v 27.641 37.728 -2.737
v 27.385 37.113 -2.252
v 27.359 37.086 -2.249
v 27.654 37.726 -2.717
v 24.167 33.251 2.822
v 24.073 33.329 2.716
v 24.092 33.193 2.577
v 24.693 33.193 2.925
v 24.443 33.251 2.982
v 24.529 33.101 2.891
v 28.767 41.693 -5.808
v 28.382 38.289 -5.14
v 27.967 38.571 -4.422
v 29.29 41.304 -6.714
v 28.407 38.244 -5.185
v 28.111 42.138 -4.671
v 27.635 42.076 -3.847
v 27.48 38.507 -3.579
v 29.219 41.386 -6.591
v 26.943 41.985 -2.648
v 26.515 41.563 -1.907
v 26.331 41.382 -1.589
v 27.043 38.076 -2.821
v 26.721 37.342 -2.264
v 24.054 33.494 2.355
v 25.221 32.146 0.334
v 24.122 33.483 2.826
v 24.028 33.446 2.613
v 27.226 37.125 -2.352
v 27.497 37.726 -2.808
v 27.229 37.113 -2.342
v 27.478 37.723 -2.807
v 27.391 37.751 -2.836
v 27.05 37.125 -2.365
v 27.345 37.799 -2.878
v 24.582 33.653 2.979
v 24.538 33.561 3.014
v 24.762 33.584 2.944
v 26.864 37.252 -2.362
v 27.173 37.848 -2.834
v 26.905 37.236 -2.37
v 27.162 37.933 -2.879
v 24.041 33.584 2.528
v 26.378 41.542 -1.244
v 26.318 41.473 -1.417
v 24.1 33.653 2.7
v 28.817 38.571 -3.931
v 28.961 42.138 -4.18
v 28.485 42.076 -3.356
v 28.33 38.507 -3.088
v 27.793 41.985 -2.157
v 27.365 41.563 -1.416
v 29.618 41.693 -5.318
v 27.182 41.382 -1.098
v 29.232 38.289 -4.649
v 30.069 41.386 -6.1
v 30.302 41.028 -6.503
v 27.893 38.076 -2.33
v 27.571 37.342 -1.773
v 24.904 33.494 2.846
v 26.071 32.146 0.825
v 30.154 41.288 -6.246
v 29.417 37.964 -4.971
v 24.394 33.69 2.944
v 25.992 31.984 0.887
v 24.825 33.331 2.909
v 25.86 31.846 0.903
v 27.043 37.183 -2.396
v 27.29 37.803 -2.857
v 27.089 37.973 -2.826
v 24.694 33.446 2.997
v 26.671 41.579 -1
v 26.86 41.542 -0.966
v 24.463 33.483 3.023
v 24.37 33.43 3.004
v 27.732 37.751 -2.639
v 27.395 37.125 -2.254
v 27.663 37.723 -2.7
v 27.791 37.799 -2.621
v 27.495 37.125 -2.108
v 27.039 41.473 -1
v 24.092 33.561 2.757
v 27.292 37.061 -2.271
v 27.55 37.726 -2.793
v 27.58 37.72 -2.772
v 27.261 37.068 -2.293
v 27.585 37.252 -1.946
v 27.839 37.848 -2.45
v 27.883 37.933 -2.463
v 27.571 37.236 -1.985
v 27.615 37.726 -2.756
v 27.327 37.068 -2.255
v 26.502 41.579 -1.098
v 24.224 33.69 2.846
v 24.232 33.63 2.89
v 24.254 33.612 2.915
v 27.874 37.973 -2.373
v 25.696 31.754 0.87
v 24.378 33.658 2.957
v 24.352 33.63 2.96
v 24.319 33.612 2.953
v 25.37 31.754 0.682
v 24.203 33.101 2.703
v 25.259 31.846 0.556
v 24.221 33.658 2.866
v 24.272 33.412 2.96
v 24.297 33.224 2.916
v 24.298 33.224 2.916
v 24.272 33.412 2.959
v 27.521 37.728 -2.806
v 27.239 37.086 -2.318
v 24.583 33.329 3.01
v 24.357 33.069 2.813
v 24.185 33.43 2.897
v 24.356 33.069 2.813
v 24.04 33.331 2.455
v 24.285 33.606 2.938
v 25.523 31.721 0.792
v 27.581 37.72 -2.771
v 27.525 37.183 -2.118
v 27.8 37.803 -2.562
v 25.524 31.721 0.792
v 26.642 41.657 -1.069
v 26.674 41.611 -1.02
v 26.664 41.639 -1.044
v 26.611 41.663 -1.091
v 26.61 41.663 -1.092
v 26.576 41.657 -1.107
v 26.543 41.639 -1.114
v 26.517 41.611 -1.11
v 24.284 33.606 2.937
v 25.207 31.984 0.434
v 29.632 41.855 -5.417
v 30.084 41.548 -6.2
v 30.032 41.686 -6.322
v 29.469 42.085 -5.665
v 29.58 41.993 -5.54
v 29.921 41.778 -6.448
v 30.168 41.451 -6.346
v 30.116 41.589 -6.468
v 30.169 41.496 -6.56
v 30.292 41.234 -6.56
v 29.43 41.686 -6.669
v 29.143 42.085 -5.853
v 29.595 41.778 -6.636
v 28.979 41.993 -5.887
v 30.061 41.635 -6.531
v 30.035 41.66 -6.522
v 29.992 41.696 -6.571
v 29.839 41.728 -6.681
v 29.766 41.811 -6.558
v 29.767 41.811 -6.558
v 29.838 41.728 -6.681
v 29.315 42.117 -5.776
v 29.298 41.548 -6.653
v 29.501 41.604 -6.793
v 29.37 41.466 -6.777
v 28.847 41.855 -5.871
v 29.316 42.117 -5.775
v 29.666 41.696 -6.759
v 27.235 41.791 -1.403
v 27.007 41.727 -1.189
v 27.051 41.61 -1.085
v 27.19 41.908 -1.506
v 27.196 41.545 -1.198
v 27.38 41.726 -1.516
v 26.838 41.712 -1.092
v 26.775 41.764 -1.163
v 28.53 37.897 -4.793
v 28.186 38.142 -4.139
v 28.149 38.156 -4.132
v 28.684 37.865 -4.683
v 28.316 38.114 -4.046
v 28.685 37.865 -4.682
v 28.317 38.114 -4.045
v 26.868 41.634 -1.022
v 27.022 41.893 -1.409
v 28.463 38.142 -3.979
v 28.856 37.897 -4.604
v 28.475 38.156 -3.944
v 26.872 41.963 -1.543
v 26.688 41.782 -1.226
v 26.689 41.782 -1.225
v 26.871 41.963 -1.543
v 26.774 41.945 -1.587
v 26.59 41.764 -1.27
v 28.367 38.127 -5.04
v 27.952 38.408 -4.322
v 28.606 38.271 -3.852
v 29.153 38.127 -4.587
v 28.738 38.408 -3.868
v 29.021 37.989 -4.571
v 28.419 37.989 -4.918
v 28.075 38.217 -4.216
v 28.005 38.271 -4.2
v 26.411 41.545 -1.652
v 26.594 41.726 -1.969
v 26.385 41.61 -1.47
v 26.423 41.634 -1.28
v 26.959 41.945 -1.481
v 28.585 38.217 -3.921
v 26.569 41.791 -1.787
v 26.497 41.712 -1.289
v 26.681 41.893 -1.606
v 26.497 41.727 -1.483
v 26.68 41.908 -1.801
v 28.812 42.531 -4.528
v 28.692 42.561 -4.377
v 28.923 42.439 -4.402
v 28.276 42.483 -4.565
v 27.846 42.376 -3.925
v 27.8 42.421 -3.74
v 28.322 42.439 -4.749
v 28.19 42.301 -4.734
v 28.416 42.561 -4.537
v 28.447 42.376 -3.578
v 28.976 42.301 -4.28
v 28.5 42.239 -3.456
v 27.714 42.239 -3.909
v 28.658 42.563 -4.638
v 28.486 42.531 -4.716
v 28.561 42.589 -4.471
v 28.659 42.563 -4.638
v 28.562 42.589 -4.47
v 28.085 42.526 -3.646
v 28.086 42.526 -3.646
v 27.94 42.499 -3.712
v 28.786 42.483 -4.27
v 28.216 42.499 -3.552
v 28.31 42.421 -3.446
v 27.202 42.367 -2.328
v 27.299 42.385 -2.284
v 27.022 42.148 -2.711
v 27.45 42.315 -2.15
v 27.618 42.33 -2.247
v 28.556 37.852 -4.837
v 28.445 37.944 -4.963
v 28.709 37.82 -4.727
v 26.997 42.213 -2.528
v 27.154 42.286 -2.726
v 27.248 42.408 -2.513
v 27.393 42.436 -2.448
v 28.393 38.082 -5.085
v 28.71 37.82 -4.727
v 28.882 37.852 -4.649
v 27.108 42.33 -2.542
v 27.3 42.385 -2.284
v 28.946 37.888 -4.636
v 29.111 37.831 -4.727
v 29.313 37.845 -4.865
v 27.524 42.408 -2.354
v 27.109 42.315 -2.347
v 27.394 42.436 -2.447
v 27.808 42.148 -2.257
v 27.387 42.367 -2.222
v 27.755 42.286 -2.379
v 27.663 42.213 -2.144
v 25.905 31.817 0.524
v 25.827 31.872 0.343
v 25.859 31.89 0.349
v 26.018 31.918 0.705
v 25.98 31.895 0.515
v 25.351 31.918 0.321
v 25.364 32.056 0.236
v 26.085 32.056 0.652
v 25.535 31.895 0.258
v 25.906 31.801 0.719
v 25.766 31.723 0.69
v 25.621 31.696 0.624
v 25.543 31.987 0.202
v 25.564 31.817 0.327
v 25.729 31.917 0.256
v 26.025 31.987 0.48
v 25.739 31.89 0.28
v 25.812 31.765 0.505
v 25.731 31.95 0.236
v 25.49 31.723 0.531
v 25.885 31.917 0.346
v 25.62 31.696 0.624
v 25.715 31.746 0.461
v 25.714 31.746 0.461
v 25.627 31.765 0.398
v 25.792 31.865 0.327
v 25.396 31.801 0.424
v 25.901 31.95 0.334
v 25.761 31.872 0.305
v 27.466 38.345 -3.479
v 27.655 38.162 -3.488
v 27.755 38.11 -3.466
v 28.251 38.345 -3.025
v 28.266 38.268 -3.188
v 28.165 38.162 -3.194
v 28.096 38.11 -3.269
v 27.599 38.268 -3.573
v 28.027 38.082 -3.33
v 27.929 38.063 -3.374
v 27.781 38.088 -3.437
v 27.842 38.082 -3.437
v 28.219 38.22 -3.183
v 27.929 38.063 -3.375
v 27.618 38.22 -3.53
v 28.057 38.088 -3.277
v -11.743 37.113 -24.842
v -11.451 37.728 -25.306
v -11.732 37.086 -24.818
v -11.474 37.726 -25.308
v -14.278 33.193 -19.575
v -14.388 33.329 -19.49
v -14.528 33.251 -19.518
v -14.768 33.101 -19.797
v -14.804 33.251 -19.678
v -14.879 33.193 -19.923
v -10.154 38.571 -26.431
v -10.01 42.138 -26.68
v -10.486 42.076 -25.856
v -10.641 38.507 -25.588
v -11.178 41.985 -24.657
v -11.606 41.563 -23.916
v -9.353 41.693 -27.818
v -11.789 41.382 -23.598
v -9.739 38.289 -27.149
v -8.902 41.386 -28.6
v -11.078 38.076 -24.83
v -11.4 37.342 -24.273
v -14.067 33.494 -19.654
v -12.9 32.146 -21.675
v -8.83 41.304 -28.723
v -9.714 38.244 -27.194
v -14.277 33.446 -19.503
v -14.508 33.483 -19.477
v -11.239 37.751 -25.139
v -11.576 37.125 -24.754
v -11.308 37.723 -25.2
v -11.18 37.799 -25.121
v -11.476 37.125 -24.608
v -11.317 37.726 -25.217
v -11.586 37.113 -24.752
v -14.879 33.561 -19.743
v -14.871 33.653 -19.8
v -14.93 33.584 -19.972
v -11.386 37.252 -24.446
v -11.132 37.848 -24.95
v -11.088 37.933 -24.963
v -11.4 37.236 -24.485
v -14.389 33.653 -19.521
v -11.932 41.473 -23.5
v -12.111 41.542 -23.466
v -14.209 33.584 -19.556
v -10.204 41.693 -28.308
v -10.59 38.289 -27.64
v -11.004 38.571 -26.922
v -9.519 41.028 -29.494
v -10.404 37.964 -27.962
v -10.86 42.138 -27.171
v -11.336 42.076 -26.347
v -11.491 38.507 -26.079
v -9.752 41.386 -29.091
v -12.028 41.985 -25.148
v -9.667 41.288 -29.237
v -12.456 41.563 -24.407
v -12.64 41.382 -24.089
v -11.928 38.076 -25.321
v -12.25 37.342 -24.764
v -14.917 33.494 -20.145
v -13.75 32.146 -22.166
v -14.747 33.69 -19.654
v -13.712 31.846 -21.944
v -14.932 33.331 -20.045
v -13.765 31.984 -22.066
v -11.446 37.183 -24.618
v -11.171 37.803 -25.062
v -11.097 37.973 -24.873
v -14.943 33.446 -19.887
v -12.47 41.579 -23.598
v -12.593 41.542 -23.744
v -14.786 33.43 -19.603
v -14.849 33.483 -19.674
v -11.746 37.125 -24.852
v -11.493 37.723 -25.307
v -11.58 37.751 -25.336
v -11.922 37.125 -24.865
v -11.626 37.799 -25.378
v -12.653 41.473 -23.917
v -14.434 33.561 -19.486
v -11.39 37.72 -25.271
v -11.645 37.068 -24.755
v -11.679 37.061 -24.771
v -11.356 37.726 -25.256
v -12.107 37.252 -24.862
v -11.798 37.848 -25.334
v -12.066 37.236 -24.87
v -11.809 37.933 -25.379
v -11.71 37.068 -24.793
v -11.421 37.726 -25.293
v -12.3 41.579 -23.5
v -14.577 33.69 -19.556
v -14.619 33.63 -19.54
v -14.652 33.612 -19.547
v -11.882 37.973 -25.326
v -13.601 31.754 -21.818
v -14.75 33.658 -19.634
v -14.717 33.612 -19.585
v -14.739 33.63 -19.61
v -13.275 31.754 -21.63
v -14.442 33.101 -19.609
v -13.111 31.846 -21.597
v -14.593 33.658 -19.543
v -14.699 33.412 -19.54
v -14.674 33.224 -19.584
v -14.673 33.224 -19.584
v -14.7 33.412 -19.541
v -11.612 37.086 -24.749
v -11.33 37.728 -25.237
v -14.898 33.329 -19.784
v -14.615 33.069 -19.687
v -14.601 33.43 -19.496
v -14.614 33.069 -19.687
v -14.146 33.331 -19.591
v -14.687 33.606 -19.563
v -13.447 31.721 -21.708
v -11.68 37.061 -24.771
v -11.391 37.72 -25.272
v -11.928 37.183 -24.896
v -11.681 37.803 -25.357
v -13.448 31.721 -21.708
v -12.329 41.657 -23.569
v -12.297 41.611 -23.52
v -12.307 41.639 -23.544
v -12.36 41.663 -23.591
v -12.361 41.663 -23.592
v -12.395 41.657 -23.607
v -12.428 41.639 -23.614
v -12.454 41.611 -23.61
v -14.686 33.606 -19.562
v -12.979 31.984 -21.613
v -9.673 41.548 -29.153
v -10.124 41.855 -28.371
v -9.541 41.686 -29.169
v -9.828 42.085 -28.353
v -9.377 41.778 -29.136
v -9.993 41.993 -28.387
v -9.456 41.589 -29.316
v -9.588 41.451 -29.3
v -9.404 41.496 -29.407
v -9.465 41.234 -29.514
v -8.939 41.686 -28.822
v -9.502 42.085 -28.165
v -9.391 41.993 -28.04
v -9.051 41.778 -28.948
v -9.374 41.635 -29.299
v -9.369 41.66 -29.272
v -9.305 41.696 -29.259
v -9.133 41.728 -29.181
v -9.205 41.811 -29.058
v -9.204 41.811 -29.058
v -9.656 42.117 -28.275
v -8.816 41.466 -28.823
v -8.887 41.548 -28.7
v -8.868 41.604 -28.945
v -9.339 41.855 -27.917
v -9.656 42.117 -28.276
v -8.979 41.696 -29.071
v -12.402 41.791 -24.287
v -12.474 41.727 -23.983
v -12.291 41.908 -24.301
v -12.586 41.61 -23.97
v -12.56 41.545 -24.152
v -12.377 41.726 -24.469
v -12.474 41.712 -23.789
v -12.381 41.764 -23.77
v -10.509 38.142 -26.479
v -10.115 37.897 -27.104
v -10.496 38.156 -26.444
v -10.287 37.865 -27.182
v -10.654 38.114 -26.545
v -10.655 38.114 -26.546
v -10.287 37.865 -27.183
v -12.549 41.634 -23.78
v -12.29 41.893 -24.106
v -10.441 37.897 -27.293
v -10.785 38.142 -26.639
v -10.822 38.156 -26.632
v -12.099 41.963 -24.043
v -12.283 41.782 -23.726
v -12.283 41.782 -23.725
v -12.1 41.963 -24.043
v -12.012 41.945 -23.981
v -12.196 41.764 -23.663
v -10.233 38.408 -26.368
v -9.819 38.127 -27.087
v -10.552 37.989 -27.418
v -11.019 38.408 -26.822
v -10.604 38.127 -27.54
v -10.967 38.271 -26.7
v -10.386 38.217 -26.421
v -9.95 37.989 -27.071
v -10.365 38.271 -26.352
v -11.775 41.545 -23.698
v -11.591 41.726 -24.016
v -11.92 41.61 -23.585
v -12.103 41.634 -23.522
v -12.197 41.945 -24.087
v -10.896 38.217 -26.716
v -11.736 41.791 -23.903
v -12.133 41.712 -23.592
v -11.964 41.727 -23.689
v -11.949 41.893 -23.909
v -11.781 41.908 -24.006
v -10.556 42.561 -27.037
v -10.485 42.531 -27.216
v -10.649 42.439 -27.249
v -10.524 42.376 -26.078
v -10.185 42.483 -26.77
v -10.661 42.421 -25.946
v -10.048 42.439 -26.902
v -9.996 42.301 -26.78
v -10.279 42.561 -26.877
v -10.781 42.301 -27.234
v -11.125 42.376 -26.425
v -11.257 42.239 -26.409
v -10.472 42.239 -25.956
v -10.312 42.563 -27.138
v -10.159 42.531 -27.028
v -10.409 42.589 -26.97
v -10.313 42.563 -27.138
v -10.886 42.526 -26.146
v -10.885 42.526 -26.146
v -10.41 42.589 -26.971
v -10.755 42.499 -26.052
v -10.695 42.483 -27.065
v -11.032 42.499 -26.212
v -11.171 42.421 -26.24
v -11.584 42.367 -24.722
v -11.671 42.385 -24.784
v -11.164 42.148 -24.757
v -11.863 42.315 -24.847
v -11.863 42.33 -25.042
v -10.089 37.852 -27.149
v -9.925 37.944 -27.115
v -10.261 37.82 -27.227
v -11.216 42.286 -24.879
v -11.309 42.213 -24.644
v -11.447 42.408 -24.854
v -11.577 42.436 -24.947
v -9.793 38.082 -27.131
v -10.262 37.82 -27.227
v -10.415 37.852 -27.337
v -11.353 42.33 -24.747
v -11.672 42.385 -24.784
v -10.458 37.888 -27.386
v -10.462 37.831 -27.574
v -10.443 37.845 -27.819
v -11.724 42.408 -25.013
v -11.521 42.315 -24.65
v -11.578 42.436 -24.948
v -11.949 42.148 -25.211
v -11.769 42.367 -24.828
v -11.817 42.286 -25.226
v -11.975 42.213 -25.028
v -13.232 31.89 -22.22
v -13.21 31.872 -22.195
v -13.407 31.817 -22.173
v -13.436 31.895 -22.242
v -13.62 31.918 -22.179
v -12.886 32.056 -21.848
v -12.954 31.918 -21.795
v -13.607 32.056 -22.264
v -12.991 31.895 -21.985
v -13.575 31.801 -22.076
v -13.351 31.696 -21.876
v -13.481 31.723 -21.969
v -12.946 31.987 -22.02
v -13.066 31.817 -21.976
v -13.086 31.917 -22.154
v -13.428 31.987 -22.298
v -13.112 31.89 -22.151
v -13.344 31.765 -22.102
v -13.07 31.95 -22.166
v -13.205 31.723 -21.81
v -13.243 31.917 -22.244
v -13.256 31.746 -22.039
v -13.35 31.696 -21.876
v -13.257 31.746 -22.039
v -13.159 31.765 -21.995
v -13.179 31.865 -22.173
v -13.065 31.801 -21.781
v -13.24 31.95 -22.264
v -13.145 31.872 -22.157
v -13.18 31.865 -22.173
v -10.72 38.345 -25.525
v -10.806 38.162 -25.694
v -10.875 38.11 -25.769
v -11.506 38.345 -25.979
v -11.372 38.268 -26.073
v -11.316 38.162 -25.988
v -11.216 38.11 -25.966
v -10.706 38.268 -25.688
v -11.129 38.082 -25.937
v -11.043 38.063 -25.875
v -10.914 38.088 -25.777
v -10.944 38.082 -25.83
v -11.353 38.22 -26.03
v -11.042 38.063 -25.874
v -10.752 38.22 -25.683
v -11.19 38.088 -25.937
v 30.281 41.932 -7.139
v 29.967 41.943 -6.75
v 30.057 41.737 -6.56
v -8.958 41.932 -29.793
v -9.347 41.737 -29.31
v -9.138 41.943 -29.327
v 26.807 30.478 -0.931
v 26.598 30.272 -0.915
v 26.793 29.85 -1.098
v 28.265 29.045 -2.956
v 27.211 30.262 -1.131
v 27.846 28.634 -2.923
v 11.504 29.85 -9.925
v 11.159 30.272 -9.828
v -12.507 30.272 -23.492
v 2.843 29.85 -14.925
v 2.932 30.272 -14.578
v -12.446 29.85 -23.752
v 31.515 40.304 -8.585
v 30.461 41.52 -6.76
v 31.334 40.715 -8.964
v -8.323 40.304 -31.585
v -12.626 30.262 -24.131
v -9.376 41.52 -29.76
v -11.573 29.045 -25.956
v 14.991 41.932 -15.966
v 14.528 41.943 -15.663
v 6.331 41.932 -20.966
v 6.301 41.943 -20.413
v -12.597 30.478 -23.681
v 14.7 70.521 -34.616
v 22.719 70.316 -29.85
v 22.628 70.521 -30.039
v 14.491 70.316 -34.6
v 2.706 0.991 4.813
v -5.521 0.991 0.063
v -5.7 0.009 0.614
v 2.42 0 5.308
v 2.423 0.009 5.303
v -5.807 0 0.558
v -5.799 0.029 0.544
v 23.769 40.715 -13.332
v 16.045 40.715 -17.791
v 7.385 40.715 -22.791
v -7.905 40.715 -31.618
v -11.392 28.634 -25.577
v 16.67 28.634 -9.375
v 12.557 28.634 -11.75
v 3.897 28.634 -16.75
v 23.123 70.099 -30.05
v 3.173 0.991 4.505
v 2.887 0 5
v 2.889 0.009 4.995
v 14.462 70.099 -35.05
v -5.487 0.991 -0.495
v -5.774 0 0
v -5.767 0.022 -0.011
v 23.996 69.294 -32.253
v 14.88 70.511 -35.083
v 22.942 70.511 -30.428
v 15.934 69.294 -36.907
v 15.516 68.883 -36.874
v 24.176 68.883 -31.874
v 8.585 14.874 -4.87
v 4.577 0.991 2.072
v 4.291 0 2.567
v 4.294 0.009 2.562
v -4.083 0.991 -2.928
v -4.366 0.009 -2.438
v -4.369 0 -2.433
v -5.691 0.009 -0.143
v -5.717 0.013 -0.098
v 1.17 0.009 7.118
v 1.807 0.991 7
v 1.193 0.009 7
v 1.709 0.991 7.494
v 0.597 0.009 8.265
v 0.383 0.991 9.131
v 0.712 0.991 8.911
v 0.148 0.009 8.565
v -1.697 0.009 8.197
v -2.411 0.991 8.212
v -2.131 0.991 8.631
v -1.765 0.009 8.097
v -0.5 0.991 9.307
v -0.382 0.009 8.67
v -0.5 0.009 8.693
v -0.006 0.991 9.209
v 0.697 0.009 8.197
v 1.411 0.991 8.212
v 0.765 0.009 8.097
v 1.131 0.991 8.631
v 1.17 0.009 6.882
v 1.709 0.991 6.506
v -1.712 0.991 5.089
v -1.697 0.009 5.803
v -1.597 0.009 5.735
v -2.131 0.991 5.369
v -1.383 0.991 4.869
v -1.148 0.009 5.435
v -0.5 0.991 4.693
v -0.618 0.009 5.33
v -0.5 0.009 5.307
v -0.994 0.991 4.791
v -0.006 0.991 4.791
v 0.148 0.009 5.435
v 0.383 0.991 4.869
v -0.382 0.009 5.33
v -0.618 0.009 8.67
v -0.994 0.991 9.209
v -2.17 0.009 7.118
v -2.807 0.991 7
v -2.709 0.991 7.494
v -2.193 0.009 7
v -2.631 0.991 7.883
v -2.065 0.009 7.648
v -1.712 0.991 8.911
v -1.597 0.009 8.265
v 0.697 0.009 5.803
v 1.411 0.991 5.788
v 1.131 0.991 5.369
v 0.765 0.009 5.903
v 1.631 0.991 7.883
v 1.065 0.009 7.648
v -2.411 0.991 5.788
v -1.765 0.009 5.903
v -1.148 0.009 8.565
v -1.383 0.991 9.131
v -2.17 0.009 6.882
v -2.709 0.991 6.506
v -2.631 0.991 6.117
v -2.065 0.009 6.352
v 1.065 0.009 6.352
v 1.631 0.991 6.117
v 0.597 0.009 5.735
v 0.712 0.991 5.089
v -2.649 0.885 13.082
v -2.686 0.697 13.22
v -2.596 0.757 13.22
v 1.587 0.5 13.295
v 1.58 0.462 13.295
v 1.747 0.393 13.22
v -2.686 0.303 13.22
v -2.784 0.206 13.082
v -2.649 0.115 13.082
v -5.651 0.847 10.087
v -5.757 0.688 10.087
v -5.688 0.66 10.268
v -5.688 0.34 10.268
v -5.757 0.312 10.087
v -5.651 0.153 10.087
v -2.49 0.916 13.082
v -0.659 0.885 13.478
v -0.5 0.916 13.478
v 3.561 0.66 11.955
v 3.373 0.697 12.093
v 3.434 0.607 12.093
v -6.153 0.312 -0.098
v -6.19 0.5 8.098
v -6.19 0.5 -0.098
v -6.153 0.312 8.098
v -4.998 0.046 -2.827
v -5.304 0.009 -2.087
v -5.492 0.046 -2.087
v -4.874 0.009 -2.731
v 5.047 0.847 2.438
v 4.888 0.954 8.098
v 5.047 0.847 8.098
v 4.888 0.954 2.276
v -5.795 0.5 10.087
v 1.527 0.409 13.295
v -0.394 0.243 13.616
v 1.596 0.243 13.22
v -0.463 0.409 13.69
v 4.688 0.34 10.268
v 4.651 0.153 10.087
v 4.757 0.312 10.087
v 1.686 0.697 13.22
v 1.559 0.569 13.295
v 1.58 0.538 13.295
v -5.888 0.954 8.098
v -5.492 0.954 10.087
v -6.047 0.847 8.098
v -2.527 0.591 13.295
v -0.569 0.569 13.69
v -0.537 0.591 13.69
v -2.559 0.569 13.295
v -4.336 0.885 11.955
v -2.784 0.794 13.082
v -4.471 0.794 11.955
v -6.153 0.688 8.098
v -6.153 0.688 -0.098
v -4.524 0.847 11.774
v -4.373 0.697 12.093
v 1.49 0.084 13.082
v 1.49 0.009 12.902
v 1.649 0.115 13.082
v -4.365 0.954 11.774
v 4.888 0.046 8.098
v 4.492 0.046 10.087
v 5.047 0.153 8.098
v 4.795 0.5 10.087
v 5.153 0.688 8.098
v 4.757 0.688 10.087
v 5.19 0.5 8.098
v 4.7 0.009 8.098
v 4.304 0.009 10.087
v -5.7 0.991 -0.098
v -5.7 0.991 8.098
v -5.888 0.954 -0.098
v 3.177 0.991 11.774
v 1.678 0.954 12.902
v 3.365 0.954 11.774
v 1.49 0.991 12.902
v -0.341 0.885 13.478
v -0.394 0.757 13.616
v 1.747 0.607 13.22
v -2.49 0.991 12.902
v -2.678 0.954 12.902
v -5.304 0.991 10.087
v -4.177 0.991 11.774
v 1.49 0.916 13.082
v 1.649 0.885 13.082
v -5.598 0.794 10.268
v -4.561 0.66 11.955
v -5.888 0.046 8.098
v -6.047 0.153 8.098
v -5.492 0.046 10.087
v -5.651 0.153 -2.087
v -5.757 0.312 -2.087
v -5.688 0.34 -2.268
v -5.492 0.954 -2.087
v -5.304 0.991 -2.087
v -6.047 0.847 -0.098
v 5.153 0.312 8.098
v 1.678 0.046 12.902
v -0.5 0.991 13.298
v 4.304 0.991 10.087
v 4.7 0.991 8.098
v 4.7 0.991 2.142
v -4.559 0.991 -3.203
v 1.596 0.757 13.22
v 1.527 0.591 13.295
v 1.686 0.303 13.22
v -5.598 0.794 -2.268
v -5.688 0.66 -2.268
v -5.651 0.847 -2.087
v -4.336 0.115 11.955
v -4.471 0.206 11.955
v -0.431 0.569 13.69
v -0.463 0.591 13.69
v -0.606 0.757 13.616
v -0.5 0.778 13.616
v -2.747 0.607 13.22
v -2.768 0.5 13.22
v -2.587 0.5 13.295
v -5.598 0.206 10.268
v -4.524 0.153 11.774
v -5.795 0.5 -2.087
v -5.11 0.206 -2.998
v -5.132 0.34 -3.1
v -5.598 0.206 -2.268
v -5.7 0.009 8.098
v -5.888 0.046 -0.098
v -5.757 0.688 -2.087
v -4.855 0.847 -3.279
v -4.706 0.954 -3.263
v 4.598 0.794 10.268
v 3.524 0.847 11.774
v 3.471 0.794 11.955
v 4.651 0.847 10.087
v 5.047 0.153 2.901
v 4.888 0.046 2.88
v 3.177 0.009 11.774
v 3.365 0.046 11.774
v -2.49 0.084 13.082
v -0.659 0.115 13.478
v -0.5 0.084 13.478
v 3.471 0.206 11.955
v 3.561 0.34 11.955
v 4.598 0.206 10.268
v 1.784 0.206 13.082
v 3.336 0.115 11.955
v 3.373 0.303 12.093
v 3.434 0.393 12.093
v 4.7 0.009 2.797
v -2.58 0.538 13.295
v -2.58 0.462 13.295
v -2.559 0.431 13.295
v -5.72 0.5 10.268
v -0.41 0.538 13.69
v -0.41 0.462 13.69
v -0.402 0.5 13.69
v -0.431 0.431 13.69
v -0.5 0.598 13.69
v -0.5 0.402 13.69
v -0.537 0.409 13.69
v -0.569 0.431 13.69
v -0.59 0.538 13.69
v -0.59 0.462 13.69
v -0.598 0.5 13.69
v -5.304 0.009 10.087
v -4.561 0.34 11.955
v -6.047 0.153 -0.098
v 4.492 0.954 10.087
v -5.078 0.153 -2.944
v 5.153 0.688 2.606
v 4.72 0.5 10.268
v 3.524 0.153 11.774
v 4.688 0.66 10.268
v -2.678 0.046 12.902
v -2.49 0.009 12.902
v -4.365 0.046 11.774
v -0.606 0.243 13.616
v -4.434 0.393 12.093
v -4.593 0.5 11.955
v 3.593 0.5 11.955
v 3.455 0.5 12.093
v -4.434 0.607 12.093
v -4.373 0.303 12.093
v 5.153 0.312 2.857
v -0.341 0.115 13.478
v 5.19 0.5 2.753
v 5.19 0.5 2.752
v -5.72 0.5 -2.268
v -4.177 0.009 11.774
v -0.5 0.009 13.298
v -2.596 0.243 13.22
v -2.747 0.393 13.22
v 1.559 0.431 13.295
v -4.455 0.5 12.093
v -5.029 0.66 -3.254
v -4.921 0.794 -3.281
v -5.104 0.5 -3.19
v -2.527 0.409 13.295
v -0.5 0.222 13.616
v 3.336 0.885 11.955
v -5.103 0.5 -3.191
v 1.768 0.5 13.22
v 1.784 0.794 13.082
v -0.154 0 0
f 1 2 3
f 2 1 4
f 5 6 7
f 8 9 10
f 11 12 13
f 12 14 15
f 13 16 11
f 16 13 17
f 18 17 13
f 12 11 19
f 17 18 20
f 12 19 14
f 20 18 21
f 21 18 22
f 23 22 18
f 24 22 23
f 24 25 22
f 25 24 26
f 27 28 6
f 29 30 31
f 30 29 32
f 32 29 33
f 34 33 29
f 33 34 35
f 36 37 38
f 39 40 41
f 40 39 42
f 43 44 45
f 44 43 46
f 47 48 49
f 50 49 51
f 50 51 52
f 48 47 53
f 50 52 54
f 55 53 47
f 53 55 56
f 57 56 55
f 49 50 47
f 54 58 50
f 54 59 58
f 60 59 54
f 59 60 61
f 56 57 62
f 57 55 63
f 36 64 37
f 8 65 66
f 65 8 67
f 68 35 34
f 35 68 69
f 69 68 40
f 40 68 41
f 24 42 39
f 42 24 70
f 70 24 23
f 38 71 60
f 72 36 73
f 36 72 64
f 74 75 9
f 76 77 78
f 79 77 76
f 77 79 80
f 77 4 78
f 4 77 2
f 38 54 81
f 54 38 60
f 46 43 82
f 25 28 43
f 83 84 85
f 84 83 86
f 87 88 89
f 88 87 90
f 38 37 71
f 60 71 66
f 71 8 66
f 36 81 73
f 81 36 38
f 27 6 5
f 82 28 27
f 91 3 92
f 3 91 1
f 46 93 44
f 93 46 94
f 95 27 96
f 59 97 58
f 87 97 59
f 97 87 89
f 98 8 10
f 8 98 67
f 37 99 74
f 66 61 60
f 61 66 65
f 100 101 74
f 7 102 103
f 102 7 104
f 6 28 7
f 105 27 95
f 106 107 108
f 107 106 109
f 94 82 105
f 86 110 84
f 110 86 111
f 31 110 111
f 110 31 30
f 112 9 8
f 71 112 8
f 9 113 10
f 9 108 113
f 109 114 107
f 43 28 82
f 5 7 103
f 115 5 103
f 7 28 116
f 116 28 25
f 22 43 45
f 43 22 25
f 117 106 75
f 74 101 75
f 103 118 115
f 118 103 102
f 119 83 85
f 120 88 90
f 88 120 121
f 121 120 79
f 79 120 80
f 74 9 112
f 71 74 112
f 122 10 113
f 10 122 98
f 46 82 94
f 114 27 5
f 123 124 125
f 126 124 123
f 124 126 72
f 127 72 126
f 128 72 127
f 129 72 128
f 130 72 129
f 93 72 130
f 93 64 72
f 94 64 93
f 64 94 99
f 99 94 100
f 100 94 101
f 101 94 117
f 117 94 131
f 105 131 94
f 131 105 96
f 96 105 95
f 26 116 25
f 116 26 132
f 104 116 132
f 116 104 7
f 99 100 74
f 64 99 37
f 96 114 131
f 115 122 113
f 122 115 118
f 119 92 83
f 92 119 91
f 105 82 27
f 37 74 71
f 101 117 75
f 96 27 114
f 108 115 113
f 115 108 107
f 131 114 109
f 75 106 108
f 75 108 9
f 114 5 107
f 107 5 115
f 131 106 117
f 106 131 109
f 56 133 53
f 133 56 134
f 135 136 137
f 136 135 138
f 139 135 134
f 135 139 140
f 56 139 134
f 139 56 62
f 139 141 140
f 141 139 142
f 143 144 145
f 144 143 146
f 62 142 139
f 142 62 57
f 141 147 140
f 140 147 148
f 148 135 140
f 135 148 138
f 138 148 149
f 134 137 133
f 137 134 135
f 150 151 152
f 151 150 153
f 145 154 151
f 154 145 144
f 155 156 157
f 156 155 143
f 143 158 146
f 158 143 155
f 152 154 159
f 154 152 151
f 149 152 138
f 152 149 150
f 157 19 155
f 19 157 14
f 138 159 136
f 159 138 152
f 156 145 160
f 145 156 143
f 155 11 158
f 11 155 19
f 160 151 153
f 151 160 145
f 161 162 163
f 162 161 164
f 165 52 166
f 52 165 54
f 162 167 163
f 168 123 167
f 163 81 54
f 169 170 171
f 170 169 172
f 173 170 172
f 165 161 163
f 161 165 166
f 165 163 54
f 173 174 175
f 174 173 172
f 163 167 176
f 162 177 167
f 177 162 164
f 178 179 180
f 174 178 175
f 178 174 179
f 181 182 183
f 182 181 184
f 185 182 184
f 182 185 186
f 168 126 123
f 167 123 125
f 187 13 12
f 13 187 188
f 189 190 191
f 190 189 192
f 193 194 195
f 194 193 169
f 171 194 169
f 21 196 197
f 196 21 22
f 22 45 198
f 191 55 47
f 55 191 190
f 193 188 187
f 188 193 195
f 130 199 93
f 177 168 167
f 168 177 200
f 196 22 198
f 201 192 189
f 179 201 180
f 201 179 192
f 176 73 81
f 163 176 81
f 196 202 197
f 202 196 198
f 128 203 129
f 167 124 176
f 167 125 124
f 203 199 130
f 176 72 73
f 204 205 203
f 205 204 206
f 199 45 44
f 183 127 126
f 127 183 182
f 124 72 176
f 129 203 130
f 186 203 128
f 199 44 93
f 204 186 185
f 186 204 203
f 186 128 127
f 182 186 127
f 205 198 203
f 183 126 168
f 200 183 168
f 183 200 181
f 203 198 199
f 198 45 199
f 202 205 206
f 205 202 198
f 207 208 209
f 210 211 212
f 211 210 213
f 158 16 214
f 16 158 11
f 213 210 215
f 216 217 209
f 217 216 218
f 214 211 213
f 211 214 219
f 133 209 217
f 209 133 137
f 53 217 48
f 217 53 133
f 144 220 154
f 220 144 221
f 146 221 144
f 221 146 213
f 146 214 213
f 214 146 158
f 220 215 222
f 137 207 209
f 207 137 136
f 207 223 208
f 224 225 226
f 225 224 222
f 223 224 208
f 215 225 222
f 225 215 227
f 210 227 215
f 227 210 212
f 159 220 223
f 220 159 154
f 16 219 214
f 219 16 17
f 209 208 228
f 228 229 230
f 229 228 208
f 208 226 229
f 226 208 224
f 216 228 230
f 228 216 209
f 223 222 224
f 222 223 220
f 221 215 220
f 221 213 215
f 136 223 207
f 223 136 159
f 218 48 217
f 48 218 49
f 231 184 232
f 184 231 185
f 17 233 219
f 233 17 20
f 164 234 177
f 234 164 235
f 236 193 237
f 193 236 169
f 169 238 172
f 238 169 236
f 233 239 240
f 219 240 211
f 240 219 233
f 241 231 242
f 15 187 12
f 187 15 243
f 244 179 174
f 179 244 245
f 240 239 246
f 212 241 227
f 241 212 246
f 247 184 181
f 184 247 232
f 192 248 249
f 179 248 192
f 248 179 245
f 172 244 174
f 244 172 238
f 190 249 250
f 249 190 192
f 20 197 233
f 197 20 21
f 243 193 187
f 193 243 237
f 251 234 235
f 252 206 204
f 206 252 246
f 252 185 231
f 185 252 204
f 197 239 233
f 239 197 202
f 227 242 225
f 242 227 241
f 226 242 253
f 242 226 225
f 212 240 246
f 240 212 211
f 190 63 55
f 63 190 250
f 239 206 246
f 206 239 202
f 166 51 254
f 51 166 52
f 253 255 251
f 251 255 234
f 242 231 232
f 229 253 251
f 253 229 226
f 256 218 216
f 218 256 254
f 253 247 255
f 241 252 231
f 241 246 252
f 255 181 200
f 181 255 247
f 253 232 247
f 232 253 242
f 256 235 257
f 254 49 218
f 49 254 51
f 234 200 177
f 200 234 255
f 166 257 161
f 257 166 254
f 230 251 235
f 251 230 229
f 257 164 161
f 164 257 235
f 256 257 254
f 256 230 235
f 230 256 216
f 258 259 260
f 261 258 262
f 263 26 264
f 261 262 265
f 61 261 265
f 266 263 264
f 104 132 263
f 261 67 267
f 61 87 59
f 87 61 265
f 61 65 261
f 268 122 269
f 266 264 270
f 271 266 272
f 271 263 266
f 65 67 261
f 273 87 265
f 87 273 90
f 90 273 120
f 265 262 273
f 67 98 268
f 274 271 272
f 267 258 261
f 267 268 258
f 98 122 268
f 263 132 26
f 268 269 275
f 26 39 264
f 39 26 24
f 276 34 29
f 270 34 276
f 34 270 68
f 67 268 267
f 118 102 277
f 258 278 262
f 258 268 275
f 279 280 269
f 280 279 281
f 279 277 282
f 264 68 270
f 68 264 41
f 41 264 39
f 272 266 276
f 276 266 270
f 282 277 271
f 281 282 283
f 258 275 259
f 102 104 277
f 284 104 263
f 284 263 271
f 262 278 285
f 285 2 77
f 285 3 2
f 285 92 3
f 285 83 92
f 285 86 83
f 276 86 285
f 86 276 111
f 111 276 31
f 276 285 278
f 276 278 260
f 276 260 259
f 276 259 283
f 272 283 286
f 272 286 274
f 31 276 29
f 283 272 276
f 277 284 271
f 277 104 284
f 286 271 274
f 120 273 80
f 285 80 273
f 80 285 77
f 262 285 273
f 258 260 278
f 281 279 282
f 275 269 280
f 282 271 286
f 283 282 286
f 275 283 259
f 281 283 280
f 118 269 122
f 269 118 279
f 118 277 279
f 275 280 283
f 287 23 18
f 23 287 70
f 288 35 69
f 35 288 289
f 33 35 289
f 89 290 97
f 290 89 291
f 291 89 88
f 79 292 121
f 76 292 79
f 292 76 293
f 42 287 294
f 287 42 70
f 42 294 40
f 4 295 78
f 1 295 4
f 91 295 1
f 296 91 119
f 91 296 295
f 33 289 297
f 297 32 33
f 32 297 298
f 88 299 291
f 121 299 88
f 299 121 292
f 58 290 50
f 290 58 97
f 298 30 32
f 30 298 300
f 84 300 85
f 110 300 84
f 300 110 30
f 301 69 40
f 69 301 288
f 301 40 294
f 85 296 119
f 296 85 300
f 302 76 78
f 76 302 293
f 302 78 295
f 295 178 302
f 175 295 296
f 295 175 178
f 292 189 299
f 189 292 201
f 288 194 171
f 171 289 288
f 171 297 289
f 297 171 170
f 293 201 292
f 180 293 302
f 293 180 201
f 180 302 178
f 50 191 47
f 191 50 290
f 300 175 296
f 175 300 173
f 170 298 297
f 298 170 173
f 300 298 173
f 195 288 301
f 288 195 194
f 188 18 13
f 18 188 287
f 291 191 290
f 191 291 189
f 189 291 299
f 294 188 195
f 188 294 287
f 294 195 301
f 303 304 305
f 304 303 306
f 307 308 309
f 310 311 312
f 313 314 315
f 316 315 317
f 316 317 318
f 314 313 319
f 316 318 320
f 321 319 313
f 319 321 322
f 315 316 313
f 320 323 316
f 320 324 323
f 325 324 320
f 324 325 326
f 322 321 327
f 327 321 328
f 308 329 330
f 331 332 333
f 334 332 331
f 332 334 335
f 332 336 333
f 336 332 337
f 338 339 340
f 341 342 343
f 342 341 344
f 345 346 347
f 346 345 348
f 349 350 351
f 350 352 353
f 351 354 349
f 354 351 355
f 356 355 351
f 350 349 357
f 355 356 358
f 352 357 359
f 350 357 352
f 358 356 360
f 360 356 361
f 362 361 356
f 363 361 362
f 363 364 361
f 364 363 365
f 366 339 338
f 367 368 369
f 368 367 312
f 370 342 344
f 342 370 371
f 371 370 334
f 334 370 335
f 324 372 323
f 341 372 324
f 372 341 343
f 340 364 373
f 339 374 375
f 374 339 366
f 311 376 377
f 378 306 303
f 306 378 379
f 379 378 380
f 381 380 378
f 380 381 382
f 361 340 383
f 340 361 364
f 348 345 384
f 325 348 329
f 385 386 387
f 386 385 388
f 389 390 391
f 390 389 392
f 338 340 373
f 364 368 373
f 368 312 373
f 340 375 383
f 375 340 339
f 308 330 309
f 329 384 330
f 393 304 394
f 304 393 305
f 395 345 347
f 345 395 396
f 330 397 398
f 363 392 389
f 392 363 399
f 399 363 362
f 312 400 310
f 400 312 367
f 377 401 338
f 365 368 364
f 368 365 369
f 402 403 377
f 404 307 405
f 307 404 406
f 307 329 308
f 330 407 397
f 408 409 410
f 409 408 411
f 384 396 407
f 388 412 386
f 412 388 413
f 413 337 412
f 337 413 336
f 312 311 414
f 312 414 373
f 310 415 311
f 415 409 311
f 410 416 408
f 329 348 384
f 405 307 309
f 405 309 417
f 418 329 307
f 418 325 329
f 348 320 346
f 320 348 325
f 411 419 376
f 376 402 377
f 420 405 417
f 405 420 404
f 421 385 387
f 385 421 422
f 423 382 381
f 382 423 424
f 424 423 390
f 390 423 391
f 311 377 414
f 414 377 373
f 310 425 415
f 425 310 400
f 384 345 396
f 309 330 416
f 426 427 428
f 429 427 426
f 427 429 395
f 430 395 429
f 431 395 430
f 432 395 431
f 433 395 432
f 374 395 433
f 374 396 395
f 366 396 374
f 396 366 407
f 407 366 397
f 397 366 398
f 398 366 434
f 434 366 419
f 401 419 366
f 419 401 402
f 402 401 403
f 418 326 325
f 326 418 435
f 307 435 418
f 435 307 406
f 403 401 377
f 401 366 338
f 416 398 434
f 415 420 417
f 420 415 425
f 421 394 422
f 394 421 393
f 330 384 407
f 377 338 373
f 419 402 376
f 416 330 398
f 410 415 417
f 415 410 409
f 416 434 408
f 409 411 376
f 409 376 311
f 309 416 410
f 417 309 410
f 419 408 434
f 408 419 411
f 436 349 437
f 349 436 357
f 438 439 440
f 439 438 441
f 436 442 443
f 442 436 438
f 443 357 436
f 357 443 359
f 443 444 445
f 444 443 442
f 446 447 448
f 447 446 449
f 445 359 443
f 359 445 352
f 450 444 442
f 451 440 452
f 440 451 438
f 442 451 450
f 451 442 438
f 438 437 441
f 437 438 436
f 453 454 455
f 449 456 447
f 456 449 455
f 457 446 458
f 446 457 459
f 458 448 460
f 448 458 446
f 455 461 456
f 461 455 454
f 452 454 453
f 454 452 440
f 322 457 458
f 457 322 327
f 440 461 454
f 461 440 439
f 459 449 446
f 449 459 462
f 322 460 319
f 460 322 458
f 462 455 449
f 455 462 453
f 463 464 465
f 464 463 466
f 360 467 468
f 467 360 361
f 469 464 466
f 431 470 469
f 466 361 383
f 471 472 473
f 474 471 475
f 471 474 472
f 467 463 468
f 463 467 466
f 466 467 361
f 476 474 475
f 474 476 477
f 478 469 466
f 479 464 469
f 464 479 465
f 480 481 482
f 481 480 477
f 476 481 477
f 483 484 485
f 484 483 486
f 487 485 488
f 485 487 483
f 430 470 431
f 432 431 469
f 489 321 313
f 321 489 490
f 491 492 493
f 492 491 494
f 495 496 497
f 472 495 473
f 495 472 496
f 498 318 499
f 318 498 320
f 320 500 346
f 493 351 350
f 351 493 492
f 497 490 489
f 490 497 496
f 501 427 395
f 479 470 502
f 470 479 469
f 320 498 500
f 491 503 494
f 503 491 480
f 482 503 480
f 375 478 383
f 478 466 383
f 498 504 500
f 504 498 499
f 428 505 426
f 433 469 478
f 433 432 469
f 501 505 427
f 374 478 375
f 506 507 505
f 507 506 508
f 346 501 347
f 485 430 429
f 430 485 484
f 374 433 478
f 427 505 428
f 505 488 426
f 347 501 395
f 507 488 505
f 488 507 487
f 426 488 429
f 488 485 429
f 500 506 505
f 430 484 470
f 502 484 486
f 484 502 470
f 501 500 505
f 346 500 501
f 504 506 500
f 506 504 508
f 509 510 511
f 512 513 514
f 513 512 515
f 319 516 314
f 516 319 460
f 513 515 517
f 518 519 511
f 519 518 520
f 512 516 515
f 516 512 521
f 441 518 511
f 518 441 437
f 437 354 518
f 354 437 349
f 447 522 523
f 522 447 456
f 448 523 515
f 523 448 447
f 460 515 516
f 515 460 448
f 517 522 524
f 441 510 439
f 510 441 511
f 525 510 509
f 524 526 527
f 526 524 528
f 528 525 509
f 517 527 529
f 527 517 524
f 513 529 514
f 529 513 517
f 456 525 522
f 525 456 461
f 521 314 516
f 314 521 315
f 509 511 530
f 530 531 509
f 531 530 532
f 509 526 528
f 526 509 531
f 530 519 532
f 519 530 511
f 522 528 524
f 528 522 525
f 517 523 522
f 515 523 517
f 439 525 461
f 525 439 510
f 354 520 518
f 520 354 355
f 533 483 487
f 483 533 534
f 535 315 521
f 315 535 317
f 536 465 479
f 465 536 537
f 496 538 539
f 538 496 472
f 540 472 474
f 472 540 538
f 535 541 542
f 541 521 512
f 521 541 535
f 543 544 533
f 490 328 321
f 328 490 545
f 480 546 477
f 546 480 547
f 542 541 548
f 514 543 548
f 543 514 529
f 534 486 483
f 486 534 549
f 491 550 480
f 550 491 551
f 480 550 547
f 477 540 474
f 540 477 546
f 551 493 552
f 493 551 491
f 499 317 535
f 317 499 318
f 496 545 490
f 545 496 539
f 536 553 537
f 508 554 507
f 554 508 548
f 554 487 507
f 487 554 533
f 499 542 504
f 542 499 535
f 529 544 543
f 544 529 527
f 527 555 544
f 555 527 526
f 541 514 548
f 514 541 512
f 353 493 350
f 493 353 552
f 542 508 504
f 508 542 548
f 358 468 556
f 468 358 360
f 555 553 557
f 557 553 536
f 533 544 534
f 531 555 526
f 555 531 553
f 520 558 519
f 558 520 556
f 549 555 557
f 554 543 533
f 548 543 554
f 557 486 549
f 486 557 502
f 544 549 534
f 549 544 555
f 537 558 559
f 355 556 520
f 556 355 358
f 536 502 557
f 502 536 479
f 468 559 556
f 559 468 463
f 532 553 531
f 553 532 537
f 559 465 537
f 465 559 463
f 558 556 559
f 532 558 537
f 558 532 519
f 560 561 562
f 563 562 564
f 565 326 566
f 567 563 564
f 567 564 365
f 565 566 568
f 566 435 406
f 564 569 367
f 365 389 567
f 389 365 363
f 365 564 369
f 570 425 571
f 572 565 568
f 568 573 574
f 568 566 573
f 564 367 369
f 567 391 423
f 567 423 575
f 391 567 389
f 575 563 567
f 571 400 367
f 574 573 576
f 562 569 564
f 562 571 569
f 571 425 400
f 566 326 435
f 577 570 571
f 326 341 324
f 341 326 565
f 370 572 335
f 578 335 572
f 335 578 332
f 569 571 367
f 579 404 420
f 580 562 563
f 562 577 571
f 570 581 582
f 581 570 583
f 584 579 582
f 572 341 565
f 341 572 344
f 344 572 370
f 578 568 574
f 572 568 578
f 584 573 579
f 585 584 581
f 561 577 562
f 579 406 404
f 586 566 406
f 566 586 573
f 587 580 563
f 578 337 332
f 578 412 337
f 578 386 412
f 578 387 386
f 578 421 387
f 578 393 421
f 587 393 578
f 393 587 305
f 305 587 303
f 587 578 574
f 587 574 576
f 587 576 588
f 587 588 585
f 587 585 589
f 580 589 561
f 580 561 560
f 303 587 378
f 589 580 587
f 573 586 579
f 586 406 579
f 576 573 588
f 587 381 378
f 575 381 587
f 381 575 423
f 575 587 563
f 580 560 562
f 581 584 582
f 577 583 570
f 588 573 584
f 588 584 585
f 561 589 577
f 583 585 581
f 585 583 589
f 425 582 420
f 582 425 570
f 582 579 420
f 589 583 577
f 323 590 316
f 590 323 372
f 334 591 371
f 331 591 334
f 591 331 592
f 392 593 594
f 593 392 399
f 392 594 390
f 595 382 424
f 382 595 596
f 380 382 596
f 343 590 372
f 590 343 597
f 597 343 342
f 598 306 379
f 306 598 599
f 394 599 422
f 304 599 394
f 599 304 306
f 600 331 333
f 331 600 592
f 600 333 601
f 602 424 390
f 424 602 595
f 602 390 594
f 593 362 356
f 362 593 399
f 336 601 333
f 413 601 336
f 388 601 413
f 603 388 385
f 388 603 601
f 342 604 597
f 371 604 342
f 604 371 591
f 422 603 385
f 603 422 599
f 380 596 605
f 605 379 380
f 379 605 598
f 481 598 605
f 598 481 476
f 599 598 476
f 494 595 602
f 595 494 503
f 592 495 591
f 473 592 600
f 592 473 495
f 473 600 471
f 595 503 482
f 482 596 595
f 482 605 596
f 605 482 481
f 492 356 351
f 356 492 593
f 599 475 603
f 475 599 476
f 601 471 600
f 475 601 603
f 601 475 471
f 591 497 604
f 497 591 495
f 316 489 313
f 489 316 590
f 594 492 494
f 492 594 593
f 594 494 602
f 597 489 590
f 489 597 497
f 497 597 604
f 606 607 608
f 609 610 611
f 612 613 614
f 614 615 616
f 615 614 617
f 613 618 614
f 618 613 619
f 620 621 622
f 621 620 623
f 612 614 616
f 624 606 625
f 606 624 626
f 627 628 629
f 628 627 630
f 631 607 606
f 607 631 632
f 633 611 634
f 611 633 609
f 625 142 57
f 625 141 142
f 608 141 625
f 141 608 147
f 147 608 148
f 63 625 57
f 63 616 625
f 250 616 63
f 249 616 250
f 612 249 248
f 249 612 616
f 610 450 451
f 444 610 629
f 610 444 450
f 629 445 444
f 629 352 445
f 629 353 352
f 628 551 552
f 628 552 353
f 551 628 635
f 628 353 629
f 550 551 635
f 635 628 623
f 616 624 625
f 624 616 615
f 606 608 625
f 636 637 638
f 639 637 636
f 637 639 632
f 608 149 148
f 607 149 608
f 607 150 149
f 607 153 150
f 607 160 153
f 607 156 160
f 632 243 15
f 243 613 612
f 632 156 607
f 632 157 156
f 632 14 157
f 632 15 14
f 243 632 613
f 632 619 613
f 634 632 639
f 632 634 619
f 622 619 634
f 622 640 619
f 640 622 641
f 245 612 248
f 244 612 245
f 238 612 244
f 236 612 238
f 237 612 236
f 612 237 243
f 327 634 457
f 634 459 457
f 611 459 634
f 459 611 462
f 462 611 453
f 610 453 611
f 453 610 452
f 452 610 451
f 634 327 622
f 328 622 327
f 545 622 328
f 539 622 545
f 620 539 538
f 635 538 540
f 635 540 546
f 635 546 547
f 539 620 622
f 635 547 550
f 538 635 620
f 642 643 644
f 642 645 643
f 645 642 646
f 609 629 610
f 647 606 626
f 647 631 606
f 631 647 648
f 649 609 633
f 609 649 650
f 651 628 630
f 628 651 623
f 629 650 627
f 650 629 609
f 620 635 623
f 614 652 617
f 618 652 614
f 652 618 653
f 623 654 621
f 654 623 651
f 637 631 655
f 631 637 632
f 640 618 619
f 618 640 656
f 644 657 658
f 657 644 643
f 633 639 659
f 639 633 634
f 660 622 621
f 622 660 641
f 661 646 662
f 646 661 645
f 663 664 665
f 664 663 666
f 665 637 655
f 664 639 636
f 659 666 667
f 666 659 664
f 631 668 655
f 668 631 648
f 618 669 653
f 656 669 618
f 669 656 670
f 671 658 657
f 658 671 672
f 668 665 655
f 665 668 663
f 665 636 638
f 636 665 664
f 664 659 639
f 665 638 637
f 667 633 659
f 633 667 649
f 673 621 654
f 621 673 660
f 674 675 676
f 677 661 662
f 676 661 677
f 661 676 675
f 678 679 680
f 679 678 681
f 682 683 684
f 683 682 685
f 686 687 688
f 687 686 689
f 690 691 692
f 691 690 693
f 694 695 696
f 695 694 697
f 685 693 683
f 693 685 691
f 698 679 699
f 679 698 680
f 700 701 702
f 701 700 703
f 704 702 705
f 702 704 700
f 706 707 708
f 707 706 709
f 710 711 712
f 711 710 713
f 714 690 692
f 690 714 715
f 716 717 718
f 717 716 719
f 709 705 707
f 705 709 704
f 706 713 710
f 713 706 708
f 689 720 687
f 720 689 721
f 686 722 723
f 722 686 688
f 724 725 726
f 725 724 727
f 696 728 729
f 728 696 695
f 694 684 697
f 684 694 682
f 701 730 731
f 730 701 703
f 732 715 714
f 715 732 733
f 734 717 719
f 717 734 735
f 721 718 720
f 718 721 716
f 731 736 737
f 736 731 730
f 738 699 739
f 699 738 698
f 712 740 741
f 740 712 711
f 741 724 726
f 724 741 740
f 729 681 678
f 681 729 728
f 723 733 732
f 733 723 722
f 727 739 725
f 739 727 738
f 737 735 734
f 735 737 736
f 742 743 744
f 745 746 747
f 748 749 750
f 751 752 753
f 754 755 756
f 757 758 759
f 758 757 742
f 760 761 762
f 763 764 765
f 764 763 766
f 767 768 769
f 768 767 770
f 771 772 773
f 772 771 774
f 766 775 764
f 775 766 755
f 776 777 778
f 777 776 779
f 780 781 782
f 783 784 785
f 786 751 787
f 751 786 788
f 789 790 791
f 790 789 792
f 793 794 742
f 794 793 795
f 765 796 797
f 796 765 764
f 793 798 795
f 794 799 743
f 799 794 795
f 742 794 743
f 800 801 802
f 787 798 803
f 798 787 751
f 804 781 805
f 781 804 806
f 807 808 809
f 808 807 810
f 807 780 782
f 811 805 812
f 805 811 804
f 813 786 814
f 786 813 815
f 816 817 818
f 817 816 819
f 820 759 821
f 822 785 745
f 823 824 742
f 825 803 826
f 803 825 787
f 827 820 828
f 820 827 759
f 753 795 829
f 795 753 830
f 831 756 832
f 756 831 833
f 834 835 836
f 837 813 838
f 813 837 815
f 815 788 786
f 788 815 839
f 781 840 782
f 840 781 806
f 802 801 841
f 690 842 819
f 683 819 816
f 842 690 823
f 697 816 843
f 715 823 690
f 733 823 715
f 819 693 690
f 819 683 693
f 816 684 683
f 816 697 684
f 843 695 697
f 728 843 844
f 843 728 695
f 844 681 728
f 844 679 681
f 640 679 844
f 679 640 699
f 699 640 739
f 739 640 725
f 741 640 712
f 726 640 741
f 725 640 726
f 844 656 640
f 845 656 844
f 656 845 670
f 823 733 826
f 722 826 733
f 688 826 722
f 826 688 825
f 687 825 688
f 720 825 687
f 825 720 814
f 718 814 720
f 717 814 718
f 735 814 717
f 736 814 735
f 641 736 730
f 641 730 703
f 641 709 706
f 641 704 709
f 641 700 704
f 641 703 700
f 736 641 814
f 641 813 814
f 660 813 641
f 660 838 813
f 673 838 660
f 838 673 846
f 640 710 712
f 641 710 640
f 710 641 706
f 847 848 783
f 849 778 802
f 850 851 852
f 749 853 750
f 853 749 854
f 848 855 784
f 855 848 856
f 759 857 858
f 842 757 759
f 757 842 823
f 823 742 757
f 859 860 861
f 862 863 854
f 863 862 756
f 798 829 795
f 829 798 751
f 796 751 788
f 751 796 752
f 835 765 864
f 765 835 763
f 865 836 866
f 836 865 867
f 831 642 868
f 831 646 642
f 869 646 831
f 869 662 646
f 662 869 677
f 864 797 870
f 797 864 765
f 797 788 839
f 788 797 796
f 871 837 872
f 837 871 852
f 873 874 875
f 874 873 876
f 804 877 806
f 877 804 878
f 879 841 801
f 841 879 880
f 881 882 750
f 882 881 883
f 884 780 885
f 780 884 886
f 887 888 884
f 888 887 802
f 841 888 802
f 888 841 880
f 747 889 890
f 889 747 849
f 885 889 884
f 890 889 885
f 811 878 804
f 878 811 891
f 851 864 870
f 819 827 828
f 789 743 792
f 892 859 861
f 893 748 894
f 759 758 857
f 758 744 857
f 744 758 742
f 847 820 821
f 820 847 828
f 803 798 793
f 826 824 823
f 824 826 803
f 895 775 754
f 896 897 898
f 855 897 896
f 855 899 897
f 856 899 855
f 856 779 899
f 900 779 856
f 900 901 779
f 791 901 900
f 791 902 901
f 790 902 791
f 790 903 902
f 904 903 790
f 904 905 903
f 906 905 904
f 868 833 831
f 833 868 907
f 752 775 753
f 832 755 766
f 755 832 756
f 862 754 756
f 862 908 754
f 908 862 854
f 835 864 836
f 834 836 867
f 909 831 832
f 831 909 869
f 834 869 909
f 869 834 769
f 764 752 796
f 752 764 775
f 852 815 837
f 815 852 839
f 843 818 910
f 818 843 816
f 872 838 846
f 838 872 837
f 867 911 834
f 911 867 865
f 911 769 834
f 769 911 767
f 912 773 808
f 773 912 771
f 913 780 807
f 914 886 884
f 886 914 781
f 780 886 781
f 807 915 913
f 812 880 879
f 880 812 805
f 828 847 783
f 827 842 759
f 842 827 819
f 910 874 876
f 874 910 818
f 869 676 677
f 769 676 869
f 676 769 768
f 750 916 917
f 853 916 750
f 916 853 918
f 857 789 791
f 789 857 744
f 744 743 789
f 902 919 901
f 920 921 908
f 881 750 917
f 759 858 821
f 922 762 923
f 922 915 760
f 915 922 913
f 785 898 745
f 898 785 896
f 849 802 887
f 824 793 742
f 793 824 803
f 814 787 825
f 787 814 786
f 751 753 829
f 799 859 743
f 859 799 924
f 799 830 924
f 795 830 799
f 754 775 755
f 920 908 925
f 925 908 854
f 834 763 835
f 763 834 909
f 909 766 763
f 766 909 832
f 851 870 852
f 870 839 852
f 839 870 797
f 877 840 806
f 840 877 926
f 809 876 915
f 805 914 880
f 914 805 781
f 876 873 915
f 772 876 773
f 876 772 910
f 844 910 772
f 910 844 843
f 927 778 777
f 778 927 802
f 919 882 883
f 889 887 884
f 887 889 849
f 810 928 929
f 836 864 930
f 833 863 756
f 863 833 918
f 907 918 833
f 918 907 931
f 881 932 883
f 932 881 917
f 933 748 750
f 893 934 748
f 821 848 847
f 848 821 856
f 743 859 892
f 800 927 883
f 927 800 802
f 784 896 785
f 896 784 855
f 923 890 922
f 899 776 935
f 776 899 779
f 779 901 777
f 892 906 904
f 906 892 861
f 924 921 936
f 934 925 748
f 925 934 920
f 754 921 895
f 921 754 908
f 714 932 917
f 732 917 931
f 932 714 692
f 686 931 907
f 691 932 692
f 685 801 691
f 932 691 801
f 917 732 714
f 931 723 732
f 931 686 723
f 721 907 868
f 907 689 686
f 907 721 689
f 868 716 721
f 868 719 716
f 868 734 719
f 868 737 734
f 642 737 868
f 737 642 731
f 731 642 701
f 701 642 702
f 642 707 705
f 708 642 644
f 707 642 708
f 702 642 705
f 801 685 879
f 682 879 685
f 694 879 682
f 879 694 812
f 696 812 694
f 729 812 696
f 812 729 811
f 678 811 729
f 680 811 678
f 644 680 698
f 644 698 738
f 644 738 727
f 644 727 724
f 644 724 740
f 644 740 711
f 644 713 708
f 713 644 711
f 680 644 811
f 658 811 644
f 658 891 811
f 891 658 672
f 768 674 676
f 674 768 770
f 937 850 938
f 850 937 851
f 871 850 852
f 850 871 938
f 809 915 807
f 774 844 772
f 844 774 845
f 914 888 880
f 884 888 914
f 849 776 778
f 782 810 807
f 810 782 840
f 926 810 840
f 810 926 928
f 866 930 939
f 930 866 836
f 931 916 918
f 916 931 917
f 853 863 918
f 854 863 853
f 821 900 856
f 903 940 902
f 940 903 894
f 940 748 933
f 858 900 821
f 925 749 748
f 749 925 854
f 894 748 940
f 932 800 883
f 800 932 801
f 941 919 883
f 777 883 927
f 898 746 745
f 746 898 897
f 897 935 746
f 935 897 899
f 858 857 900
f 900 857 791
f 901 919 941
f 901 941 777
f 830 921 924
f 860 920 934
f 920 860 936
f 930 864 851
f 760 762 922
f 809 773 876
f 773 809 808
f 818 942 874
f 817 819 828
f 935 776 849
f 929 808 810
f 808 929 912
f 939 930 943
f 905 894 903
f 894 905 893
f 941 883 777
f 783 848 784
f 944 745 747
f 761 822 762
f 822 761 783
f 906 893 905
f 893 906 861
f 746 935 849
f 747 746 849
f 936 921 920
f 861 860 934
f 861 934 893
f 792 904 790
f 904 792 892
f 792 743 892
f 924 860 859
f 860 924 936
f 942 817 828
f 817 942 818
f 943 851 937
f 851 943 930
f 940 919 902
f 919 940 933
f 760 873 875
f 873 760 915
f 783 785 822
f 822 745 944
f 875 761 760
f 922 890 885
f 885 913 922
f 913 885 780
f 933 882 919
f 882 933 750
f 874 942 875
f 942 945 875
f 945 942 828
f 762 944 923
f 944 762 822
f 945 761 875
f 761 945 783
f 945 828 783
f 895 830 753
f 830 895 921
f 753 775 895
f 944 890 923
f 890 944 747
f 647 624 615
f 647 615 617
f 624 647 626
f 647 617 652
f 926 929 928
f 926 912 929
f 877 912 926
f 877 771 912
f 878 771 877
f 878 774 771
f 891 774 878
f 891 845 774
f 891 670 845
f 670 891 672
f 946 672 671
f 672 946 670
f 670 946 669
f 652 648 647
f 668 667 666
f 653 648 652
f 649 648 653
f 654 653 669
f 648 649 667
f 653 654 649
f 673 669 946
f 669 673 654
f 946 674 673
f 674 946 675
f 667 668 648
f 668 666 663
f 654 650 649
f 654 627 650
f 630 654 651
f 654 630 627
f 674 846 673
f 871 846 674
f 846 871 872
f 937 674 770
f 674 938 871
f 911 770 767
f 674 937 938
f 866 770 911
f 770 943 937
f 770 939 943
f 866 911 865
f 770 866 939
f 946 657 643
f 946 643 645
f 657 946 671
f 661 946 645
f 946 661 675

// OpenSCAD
epsilon = 0.001;

// Dimensions
body_width=46;
wheel_width=10;
body_to_wheel_width=2;
rear_to_axle = 35;
axle_width = body_width+2*(wheel_width+body_to_wheel_width);
axle_radius = 1.25;
axle_notch_radius = 2.5;
back_flat_width = 10;
back_flat_length = 40;
back_cube_length = 10;
back_incline_length = 5;
back_incline_height = 16;

car_length = 178;
car_width = 45;
car_height = 32;
car_back_axle = 35;
car_front_axle = 112;


// Undercarriage
uc_length = 40;
uc_width = 10;
uc_height = 6;

// Side support at axle.
ssa_radius = 7;
ssa_depth = 1;
ssa_base_length = ssa_radius*2;
ssa_width = body_width;


screw_head_radius = 4;
screw_head_height = 4;
screw_head_fudge = 0.2;
screw_hole_radius = 1.5;
screw_hole_fudge = [0, -3, 7];

screw_mount_depth = 1;
screw_mount_height = 8;
screw_mount_radius_fudge = 0.2;


car_bracket_rotation=[-30, -30, 0];

module reflect_x() {
    union() {
        children(0);
        mirror([1, 0, 0]) children(0);
    }
}

module reflect_y() {
    union() {
        children(0);
        mirror([0, 1, 0]) children(0);
    }
}

module reflect_z() {
    union() {
        children(0);
        mirror([0, 0, 1]) children(0);
    }
}

module reflect_xy() {
    reflect_x() reflect_y() children(0);
}


module reflect_yz() {
    reflect_y() reflect_z() children(0);
}

module reflect_xyz() {
    reflect_z() reflect_y() reflect_x() children(0);
}


module mink_it(sphere_r) {
    $fn=16;
    minkowski() {
        children(0);
        sphere(r=sphere_r);
    }
}

module uc_base() {
    hull() {
        reflect_xyz()
            translate([(uc_width/2-ssa_depth/2), uc_length/2-ssa_depth/2, uc_height/2-ssa_depth/2]) 
                sphere(r = ssa_depth/2);
    }
}

module wheel() {
    translate([-(wheel_width/2), 0, 0])
    rotate([0, 90, 0]) cylinder(h=wheel_width, r=15);
}

module axle() {
    translate([-(axle_width/2), 0, 0])
    rotate([0, 90, 0]) cylinder(h=axle_width, r=axle_radius, $fn=8);
}


module debug_wheels() {
    translate([0, 0, 3]) {
        axle();
        reflect_x() {
            translate([+(body_to_wheel_width+wheel_width/2+body_width/2), 0, 0])
                wheel();
        }
    }
}

module uc_bracket() {
    //translate([-(body_width/2-uc_width/2), uc_length/2, 0]) {
    translate([0, uc_length/2, 0]) {
        uc_base();
    }
}

module axle_slot_neg(r) {
    hull() {
        translate([0, -10, 0]) axle_notch(r);
        axle_notch(r);
    }
}

module ssa() {
    mink_it(0.5) difference() {
        // translate([0, 0, ssa_radius])
        //    cube([ssa_depth, ssa_radius*2, ssa_radius*2], center=true);
        intersection() {
            cube([epsilon, ssa_base_length-2, 10], center=true);
            axle_slot_neg(6);
            translate([0, 0, 50-uc_height/2])
                cube([100, 100, 100], center = true);
        }
        axle_slot_neg(axle_notch_radius);
        
    }
}

module ssa_base() {
    hull() {
        reflect_xyz()
            translate([(body_width/2-ssa_depth/2), ssa_base_length/2-ssa_depth/2, uc_height/2-ssa_depth/2]) 
                sphere(r = ssa_depth/2);
    }
}

module axle_notch(r) {
    translate([-(axle_width/2), 0, 0])
    rotate([0, 90, 0]) cylinder(h=axle_width, r=r, $fn=16);
}


module ssa_bracket() {
    difference() {
        union() {
            ssa_base();
            reflect_x() 
                translate([body_width/2-ssa_depth/2, 0, uc_height/2])
                    ssa();
        }
    }
}

fudge_incline_width=3;
module back_bracket() {
    translate([0, -back_flat_length/2+fudge_incline_width-ssa_depth/2, 0]) {
        hull() {
            reflect_xyz()
                translate([(back_flat_width/2-ssa_depth/2), back_flat_length/2+back_incline_length-ssa_depth/2, uc_height/2-ssa_depth/2]) 
                    sphere(r = ssa_depth/2);        
        }
    }
}

module car_bracket() {
    //#debug_wheels();
    ssa_bracket();
    uc_bracket();
    back_bracket();
}

module screw_mount_neg() {
    translate([0, -50, 0]) cube([100, 100, 100], center=true);
}

module screw_hole_neg() {
    $fn=16;
    rotate([90, 0, 0]) cylinder(h = 30, r = screw_hole_radius, center=true);
    translate([0, screw_head_height+screw_head_fudge, 0])
    rotate([90, 0, 0]) cylinder(h = screw_head_height + epsilon, r2 = screw_hole_radius, r1 = screw_head_radius, center=true);
}

// The part that attaches to the wall, where the screw goes.
module wall_mount() {
    translate([-.5, 0.5, 0])
        difference() {
            mink_it(0.5) {
                hull() {
                    translate([0, 0, screw_mount_height])
                        rotate([90, 0, 0])
                            cylinder(h = epsilon, r=back_flat_width/2+screw_mount_radius_fudge, center=true);
                    rotate([90, 0, 0])
                        cylinder(h = epsilon, r=back_flat_width/2+screw_mount_radius_fudge, center=true);
                }
            }
            translate(screw_hole_fudge) #screw_hole_neg();
        }
}

// Used to cut off excess so it can lay flat on the printbed.
module flush_intersect() {
    translate([0, 0, 20]) hull() {
        reflect_xyz()
            translate([(60-ssa_depth/2), 200-ssa_depth/2, 20-ssa_depth/2]) 
                sphere(r = ssa_depth/2);
    }
}

module wall_bracket() {
    intersection() {
        union() {
            rotate(car_bracket_rotation)
                translate([0, back_flat_length, 0])
                    car_bracket();
            wall_mount();
        }
        // Trim the bottom of the mount so it sits flush against the bed. 
        rotate(car_bracket_rotation) flush_intersect();
        // Trim the back so it sits flush against the wall.
        translate([0, 50, 0]) cube([100, 100, 100], center = true);
    }
}

//ssa();
//car_bracket();
wall_bracket();
//wall_mount();
